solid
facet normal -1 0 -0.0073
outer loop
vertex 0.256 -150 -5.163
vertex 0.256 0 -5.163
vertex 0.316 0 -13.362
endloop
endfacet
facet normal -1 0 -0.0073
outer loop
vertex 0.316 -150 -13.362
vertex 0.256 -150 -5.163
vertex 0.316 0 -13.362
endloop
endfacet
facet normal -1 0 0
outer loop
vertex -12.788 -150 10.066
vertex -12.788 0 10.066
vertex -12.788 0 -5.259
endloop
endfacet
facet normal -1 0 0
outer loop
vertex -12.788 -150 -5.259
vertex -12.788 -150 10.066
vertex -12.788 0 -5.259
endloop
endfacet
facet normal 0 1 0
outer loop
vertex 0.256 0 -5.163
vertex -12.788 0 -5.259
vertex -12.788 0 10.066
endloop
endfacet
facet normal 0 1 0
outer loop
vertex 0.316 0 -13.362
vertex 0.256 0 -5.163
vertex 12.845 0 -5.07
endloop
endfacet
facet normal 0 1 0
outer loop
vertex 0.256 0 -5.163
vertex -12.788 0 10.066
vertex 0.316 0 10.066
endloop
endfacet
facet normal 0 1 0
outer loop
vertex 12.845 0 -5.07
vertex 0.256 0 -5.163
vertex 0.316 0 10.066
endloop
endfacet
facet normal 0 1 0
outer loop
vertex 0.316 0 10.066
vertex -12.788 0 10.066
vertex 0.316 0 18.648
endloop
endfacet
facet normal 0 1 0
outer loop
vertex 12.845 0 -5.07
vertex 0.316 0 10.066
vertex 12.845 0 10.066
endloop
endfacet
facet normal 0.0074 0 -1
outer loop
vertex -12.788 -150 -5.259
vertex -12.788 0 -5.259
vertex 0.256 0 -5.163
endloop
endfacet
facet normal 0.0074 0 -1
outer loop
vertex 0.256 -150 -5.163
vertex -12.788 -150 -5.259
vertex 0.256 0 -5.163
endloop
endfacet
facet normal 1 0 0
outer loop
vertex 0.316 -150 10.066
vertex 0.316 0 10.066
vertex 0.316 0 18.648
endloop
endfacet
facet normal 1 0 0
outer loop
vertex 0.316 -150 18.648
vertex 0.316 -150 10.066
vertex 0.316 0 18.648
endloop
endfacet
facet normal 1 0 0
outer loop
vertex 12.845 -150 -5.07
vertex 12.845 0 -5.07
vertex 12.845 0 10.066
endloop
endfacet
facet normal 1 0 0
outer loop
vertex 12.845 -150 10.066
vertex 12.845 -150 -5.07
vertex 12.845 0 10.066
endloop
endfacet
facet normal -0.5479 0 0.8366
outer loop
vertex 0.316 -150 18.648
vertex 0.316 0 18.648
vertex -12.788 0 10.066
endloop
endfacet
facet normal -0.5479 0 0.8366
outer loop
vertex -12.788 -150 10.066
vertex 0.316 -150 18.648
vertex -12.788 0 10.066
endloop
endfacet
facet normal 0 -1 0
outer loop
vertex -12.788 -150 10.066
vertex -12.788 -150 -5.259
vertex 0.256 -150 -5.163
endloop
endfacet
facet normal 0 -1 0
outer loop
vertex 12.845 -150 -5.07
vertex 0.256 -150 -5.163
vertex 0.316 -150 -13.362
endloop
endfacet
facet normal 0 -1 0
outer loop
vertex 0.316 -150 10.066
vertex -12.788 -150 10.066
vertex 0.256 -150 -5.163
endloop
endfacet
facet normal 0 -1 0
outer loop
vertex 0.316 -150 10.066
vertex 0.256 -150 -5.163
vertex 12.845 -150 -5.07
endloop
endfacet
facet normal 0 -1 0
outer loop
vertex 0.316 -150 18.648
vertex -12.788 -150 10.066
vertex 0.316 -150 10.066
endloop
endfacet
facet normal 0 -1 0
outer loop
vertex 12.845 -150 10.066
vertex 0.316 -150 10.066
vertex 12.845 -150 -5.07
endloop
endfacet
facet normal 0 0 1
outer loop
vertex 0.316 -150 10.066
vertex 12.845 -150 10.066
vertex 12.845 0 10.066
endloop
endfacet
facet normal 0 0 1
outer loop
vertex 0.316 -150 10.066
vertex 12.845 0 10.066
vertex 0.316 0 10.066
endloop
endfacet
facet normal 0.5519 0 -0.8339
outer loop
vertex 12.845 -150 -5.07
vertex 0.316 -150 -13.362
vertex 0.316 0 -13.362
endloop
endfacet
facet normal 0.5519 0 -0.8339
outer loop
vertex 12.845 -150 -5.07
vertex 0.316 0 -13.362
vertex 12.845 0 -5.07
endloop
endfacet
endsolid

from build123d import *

# Parameters (mm, degrees)
F1_DEPTH = 150


# Not quite as in the source:
# - a feature of the source that left no trace in its solid (it failed there, or was rolled back) is left out


with BuildPart() as f1:
    # F0 (on Front) → F1 (new body)
    with BuildSketch(Plane.XZ):
        Polygon((0.316192396, 10.0656654686), (-12.7883255482, 10.0656654686), (-12.7883255482, -5.258587189), (0.2559647712, -5.1627713866), (12.8449704498, -5.0702998415), (12.8449704498, 10.0656654686), align=None)
        Polygon((0.316192396, 18.6481969431), (-12.7883255482, 10.0656654686), (0.316192396, 10.0656654686), align=None)
        Polygon((12.8449704498, -5.0702998415), (0.2559647712, -5.1627713866), (0.316192396, -13.3621143177), align=None)
    extrude(amount=F1_DEPTH)


solid = f1.part
